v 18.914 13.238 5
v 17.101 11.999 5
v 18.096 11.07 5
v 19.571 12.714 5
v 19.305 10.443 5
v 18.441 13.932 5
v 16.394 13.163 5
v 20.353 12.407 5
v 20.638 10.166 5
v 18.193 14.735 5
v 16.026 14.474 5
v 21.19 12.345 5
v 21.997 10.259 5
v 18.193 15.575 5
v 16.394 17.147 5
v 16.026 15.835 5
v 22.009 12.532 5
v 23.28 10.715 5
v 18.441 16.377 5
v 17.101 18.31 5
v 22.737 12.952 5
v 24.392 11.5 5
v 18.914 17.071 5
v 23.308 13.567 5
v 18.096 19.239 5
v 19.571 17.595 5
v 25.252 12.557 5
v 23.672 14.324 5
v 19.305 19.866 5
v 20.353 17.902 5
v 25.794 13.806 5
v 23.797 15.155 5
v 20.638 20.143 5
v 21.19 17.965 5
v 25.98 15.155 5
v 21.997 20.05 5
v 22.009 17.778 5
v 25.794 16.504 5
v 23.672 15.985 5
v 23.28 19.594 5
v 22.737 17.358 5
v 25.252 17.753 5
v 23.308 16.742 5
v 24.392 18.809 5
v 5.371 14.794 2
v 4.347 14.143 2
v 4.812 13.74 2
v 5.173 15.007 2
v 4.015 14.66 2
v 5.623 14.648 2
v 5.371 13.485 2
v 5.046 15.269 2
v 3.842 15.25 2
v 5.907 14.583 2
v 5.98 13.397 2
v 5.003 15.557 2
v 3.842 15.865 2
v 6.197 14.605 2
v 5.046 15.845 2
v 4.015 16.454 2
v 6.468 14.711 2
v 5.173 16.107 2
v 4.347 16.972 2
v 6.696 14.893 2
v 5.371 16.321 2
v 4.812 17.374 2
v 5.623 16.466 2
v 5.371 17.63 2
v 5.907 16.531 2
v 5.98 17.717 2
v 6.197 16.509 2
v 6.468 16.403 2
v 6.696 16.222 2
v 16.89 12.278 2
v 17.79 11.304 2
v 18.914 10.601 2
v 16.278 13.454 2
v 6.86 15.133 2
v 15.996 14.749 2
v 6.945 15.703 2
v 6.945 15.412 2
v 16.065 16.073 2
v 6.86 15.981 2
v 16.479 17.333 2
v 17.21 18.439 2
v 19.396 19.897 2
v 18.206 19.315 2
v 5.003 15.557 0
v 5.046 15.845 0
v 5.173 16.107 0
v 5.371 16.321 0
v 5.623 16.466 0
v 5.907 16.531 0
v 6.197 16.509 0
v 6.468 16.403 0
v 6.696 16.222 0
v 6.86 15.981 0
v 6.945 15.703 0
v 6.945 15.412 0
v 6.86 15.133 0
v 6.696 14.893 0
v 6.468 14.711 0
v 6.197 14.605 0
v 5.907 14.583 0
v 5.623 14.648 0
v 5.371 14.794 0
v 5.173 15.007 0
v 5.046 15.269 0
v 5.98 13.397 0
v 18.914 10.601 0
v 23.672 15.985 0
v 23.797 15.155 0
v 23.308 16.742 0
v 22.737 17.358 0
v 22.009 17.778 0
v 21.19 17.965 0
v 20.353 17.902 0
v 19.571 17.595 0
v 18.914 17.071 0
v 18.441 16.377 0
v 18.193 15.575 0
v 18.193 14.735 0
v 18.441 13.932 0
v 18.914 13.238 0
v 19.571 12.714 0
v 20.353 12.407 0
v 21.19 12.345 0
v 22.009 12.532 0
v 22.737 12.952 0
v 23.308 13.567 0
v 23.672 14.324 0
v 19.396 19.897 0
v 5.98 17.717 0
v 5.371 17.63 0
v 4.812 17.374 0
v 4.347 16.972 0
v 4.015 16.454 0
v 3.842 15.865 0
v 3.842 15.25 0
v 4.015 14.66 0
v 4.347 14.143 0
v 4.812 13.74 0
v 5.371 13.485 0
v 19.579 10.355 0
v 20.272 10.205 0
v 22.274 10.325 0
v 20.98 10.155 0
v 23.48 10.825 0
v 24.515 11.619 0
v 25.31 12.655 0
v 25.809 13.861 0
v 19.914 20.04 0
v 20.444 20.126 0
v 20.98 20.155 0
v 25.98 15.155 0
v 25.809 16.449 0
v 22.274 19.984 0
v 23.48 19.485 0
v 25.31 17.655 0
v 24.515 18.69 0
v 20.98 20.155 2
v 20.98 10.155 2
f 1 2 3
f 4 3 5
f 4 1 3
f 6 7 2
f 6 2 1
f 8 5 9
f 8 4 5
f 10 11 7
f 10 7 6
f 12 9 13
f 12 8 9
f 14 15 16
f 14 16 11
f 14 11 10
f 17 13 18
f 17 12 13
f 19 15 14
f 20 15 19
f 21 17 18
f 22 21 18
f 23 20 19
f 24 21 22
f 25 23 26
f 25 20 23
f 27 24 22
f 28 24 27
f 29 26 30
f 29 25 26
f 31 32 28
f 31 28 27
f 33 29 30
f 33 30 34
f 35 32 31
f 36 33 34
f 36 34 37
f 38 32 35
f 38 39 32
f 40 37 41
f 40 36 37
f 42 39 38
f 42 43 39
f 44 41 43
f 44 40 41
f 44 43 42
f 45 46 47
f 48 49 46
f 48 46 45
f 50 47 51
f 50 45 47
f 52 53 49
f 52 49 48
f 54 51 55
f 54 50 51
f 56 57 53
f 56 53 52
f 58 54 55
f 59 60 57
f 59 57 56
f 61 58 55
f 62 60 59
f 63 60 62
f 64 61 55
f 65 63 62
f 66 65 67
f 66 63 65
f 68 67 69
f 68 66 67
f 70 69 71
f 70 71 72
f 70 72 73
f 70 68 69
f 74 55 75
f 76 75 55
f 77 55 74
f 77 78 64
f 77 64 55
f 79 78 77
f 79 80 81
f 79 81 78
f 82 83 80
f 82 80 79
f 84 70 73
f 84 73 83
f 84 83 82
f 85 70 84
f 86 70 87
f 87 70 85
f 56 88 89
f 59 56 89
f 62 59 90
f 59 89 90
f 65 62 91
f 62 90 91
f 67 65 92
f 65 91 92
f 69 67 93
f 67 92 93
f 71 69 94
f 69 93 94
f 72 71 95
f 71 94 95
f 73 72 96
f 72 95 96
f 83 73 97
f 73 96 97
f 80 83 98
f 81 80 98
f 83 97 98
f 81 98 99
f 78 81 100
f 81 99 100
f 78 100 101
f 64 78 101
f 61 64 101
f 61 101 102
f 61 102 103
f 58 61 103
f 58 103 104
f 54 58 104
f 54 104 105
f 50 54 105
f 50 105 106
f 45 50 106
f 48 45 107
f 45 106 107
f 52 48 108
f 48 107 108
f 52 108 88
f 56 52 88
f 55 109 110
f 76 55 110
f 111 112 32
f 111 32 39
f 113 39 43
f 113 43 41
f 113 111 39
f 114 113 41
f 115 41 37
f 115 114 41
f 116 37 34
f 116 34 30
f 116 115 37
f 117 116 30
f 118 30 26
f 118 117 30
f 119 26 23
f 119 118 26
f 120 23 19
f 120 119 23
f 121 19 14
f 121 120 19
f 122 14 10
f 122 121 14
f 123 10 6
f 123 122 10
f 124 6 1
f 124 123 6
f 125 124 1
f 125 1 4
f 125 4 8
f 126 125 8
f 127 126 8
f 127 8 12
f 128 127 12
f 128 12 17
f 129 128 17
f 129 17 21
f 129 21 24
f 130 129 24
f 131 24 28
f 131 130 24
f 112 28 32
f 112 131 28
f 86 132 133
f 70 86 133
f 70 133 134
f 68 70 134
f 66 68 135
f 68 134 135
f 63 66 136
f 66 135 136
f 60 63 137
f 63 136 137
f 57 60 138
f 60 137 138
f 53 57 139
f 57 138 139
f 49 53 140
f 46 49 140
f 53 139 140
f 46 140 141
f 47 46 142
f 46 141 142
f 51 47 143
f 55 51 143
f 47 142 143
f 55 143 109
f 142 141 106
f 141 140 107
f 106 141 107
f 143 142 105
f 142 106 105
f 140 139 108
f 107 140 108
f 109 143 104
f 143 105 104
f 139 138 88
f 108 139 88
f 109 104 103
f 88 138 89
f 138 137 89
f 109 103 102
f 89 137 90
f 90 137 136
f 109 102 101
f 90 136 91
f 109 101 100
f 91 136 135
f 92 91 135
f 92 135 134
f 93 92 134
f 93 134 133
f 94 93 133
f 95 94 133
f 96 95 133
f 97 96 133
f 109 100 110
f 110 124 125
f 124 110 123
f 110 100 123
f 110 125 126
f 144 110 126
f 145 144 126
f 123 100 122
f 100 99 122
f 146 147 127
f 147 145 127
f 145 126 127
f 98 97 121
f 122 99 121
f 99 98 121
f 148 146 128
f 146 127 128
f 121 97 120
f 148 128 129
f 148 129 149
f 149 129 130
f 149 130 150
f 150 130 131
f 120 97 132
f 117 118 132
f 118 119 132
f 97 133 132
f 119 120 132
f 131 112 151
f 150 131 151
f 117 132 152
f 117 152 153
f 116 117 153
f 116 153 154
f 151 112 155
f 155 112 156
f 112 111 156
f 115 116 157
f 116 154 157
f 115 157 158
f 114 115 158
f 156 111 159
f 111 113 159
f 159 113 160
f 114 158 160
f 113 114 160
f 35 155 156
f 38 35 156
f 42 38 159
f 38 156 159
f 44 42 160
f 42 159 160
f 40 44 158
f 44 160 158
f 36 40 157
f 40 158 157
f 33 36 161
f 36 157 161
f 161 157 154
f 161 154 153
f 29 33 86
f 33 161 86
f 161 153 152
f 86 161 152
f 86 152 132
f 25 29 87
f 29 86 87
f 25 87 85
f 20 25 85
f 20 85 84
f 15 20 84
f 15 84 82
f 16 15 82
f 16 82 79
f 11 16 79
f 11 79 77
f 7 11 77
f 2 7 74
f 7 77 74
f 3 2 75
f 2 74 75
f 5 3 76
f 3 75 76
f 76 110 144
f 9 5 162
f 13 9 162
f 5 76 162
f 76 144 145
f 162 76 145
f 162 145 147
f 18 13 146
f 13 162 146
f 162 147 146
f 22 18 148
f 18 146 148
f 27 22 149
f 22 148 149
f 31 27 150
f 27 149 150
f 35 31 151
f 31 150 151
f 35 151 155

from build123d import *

# Parameters (mm, degrees)
SKETCH_1_R      = 5
SKETCH_1_R_2    = 2.817909336
EXTRUDE_1_DEPTH = 5
SKETCH_2_R      = 0.976753742
EXTRUDE_2_DEPTH = 2


with BuildPart() as part:
    # 草图1 → 凸台-拉伸1 (new body)
    with BuildSketch(Plane.XY):
        with Locations((20.979563361, 15.154638973)):
            Circle(SKETCH_1_R)
        with Locations((20.979563361, 15.154638973)):
            Circle(SKETCH_1_R_2, mode=Mode.SUBTRACT)
    extrude(amount=EXTRUDE_1_DEPTH)

    # 草图2 → 凸台-拉伸2 (add)
    with BuildSketch(Plane(origin=(0, 0, 0), x_dir=(-1, 0, 0), z_dir=(0, 0, -1))):
        with BuildLine():
            Line((-20.979563361, 20.154638973), (-5.979563361, 17.717173943))
            ThreePointArc((-5.979563361, 17.717173943), (-3.819583674, 15.557194255), (-5.979563361, 13.397214568))
            Line((-5.979563361, 13.397214568), (-20.979563361, 10.154638973))
            Line((-20.979563361, 10.154638973), (-20.873226182, 11.0026068))
            Line((-20.873226182, 11.0026068), (-17.89105269, 13.59821912))
            Line((-17.89105269, 13.59821912), (-17.479167483, 16.13293368))
            Line((-17.479167483, 16.13293368), (-20.979563361, 20.154638973))
        make_face()
        with Locations((-5.979563361, 15.557194255)):
            Circle(SKETCH_2_R, mode=Mode.SUBTRACT)
    extrude(amount=-EXTRUDE_2_DEPTH)


solid = part.part
